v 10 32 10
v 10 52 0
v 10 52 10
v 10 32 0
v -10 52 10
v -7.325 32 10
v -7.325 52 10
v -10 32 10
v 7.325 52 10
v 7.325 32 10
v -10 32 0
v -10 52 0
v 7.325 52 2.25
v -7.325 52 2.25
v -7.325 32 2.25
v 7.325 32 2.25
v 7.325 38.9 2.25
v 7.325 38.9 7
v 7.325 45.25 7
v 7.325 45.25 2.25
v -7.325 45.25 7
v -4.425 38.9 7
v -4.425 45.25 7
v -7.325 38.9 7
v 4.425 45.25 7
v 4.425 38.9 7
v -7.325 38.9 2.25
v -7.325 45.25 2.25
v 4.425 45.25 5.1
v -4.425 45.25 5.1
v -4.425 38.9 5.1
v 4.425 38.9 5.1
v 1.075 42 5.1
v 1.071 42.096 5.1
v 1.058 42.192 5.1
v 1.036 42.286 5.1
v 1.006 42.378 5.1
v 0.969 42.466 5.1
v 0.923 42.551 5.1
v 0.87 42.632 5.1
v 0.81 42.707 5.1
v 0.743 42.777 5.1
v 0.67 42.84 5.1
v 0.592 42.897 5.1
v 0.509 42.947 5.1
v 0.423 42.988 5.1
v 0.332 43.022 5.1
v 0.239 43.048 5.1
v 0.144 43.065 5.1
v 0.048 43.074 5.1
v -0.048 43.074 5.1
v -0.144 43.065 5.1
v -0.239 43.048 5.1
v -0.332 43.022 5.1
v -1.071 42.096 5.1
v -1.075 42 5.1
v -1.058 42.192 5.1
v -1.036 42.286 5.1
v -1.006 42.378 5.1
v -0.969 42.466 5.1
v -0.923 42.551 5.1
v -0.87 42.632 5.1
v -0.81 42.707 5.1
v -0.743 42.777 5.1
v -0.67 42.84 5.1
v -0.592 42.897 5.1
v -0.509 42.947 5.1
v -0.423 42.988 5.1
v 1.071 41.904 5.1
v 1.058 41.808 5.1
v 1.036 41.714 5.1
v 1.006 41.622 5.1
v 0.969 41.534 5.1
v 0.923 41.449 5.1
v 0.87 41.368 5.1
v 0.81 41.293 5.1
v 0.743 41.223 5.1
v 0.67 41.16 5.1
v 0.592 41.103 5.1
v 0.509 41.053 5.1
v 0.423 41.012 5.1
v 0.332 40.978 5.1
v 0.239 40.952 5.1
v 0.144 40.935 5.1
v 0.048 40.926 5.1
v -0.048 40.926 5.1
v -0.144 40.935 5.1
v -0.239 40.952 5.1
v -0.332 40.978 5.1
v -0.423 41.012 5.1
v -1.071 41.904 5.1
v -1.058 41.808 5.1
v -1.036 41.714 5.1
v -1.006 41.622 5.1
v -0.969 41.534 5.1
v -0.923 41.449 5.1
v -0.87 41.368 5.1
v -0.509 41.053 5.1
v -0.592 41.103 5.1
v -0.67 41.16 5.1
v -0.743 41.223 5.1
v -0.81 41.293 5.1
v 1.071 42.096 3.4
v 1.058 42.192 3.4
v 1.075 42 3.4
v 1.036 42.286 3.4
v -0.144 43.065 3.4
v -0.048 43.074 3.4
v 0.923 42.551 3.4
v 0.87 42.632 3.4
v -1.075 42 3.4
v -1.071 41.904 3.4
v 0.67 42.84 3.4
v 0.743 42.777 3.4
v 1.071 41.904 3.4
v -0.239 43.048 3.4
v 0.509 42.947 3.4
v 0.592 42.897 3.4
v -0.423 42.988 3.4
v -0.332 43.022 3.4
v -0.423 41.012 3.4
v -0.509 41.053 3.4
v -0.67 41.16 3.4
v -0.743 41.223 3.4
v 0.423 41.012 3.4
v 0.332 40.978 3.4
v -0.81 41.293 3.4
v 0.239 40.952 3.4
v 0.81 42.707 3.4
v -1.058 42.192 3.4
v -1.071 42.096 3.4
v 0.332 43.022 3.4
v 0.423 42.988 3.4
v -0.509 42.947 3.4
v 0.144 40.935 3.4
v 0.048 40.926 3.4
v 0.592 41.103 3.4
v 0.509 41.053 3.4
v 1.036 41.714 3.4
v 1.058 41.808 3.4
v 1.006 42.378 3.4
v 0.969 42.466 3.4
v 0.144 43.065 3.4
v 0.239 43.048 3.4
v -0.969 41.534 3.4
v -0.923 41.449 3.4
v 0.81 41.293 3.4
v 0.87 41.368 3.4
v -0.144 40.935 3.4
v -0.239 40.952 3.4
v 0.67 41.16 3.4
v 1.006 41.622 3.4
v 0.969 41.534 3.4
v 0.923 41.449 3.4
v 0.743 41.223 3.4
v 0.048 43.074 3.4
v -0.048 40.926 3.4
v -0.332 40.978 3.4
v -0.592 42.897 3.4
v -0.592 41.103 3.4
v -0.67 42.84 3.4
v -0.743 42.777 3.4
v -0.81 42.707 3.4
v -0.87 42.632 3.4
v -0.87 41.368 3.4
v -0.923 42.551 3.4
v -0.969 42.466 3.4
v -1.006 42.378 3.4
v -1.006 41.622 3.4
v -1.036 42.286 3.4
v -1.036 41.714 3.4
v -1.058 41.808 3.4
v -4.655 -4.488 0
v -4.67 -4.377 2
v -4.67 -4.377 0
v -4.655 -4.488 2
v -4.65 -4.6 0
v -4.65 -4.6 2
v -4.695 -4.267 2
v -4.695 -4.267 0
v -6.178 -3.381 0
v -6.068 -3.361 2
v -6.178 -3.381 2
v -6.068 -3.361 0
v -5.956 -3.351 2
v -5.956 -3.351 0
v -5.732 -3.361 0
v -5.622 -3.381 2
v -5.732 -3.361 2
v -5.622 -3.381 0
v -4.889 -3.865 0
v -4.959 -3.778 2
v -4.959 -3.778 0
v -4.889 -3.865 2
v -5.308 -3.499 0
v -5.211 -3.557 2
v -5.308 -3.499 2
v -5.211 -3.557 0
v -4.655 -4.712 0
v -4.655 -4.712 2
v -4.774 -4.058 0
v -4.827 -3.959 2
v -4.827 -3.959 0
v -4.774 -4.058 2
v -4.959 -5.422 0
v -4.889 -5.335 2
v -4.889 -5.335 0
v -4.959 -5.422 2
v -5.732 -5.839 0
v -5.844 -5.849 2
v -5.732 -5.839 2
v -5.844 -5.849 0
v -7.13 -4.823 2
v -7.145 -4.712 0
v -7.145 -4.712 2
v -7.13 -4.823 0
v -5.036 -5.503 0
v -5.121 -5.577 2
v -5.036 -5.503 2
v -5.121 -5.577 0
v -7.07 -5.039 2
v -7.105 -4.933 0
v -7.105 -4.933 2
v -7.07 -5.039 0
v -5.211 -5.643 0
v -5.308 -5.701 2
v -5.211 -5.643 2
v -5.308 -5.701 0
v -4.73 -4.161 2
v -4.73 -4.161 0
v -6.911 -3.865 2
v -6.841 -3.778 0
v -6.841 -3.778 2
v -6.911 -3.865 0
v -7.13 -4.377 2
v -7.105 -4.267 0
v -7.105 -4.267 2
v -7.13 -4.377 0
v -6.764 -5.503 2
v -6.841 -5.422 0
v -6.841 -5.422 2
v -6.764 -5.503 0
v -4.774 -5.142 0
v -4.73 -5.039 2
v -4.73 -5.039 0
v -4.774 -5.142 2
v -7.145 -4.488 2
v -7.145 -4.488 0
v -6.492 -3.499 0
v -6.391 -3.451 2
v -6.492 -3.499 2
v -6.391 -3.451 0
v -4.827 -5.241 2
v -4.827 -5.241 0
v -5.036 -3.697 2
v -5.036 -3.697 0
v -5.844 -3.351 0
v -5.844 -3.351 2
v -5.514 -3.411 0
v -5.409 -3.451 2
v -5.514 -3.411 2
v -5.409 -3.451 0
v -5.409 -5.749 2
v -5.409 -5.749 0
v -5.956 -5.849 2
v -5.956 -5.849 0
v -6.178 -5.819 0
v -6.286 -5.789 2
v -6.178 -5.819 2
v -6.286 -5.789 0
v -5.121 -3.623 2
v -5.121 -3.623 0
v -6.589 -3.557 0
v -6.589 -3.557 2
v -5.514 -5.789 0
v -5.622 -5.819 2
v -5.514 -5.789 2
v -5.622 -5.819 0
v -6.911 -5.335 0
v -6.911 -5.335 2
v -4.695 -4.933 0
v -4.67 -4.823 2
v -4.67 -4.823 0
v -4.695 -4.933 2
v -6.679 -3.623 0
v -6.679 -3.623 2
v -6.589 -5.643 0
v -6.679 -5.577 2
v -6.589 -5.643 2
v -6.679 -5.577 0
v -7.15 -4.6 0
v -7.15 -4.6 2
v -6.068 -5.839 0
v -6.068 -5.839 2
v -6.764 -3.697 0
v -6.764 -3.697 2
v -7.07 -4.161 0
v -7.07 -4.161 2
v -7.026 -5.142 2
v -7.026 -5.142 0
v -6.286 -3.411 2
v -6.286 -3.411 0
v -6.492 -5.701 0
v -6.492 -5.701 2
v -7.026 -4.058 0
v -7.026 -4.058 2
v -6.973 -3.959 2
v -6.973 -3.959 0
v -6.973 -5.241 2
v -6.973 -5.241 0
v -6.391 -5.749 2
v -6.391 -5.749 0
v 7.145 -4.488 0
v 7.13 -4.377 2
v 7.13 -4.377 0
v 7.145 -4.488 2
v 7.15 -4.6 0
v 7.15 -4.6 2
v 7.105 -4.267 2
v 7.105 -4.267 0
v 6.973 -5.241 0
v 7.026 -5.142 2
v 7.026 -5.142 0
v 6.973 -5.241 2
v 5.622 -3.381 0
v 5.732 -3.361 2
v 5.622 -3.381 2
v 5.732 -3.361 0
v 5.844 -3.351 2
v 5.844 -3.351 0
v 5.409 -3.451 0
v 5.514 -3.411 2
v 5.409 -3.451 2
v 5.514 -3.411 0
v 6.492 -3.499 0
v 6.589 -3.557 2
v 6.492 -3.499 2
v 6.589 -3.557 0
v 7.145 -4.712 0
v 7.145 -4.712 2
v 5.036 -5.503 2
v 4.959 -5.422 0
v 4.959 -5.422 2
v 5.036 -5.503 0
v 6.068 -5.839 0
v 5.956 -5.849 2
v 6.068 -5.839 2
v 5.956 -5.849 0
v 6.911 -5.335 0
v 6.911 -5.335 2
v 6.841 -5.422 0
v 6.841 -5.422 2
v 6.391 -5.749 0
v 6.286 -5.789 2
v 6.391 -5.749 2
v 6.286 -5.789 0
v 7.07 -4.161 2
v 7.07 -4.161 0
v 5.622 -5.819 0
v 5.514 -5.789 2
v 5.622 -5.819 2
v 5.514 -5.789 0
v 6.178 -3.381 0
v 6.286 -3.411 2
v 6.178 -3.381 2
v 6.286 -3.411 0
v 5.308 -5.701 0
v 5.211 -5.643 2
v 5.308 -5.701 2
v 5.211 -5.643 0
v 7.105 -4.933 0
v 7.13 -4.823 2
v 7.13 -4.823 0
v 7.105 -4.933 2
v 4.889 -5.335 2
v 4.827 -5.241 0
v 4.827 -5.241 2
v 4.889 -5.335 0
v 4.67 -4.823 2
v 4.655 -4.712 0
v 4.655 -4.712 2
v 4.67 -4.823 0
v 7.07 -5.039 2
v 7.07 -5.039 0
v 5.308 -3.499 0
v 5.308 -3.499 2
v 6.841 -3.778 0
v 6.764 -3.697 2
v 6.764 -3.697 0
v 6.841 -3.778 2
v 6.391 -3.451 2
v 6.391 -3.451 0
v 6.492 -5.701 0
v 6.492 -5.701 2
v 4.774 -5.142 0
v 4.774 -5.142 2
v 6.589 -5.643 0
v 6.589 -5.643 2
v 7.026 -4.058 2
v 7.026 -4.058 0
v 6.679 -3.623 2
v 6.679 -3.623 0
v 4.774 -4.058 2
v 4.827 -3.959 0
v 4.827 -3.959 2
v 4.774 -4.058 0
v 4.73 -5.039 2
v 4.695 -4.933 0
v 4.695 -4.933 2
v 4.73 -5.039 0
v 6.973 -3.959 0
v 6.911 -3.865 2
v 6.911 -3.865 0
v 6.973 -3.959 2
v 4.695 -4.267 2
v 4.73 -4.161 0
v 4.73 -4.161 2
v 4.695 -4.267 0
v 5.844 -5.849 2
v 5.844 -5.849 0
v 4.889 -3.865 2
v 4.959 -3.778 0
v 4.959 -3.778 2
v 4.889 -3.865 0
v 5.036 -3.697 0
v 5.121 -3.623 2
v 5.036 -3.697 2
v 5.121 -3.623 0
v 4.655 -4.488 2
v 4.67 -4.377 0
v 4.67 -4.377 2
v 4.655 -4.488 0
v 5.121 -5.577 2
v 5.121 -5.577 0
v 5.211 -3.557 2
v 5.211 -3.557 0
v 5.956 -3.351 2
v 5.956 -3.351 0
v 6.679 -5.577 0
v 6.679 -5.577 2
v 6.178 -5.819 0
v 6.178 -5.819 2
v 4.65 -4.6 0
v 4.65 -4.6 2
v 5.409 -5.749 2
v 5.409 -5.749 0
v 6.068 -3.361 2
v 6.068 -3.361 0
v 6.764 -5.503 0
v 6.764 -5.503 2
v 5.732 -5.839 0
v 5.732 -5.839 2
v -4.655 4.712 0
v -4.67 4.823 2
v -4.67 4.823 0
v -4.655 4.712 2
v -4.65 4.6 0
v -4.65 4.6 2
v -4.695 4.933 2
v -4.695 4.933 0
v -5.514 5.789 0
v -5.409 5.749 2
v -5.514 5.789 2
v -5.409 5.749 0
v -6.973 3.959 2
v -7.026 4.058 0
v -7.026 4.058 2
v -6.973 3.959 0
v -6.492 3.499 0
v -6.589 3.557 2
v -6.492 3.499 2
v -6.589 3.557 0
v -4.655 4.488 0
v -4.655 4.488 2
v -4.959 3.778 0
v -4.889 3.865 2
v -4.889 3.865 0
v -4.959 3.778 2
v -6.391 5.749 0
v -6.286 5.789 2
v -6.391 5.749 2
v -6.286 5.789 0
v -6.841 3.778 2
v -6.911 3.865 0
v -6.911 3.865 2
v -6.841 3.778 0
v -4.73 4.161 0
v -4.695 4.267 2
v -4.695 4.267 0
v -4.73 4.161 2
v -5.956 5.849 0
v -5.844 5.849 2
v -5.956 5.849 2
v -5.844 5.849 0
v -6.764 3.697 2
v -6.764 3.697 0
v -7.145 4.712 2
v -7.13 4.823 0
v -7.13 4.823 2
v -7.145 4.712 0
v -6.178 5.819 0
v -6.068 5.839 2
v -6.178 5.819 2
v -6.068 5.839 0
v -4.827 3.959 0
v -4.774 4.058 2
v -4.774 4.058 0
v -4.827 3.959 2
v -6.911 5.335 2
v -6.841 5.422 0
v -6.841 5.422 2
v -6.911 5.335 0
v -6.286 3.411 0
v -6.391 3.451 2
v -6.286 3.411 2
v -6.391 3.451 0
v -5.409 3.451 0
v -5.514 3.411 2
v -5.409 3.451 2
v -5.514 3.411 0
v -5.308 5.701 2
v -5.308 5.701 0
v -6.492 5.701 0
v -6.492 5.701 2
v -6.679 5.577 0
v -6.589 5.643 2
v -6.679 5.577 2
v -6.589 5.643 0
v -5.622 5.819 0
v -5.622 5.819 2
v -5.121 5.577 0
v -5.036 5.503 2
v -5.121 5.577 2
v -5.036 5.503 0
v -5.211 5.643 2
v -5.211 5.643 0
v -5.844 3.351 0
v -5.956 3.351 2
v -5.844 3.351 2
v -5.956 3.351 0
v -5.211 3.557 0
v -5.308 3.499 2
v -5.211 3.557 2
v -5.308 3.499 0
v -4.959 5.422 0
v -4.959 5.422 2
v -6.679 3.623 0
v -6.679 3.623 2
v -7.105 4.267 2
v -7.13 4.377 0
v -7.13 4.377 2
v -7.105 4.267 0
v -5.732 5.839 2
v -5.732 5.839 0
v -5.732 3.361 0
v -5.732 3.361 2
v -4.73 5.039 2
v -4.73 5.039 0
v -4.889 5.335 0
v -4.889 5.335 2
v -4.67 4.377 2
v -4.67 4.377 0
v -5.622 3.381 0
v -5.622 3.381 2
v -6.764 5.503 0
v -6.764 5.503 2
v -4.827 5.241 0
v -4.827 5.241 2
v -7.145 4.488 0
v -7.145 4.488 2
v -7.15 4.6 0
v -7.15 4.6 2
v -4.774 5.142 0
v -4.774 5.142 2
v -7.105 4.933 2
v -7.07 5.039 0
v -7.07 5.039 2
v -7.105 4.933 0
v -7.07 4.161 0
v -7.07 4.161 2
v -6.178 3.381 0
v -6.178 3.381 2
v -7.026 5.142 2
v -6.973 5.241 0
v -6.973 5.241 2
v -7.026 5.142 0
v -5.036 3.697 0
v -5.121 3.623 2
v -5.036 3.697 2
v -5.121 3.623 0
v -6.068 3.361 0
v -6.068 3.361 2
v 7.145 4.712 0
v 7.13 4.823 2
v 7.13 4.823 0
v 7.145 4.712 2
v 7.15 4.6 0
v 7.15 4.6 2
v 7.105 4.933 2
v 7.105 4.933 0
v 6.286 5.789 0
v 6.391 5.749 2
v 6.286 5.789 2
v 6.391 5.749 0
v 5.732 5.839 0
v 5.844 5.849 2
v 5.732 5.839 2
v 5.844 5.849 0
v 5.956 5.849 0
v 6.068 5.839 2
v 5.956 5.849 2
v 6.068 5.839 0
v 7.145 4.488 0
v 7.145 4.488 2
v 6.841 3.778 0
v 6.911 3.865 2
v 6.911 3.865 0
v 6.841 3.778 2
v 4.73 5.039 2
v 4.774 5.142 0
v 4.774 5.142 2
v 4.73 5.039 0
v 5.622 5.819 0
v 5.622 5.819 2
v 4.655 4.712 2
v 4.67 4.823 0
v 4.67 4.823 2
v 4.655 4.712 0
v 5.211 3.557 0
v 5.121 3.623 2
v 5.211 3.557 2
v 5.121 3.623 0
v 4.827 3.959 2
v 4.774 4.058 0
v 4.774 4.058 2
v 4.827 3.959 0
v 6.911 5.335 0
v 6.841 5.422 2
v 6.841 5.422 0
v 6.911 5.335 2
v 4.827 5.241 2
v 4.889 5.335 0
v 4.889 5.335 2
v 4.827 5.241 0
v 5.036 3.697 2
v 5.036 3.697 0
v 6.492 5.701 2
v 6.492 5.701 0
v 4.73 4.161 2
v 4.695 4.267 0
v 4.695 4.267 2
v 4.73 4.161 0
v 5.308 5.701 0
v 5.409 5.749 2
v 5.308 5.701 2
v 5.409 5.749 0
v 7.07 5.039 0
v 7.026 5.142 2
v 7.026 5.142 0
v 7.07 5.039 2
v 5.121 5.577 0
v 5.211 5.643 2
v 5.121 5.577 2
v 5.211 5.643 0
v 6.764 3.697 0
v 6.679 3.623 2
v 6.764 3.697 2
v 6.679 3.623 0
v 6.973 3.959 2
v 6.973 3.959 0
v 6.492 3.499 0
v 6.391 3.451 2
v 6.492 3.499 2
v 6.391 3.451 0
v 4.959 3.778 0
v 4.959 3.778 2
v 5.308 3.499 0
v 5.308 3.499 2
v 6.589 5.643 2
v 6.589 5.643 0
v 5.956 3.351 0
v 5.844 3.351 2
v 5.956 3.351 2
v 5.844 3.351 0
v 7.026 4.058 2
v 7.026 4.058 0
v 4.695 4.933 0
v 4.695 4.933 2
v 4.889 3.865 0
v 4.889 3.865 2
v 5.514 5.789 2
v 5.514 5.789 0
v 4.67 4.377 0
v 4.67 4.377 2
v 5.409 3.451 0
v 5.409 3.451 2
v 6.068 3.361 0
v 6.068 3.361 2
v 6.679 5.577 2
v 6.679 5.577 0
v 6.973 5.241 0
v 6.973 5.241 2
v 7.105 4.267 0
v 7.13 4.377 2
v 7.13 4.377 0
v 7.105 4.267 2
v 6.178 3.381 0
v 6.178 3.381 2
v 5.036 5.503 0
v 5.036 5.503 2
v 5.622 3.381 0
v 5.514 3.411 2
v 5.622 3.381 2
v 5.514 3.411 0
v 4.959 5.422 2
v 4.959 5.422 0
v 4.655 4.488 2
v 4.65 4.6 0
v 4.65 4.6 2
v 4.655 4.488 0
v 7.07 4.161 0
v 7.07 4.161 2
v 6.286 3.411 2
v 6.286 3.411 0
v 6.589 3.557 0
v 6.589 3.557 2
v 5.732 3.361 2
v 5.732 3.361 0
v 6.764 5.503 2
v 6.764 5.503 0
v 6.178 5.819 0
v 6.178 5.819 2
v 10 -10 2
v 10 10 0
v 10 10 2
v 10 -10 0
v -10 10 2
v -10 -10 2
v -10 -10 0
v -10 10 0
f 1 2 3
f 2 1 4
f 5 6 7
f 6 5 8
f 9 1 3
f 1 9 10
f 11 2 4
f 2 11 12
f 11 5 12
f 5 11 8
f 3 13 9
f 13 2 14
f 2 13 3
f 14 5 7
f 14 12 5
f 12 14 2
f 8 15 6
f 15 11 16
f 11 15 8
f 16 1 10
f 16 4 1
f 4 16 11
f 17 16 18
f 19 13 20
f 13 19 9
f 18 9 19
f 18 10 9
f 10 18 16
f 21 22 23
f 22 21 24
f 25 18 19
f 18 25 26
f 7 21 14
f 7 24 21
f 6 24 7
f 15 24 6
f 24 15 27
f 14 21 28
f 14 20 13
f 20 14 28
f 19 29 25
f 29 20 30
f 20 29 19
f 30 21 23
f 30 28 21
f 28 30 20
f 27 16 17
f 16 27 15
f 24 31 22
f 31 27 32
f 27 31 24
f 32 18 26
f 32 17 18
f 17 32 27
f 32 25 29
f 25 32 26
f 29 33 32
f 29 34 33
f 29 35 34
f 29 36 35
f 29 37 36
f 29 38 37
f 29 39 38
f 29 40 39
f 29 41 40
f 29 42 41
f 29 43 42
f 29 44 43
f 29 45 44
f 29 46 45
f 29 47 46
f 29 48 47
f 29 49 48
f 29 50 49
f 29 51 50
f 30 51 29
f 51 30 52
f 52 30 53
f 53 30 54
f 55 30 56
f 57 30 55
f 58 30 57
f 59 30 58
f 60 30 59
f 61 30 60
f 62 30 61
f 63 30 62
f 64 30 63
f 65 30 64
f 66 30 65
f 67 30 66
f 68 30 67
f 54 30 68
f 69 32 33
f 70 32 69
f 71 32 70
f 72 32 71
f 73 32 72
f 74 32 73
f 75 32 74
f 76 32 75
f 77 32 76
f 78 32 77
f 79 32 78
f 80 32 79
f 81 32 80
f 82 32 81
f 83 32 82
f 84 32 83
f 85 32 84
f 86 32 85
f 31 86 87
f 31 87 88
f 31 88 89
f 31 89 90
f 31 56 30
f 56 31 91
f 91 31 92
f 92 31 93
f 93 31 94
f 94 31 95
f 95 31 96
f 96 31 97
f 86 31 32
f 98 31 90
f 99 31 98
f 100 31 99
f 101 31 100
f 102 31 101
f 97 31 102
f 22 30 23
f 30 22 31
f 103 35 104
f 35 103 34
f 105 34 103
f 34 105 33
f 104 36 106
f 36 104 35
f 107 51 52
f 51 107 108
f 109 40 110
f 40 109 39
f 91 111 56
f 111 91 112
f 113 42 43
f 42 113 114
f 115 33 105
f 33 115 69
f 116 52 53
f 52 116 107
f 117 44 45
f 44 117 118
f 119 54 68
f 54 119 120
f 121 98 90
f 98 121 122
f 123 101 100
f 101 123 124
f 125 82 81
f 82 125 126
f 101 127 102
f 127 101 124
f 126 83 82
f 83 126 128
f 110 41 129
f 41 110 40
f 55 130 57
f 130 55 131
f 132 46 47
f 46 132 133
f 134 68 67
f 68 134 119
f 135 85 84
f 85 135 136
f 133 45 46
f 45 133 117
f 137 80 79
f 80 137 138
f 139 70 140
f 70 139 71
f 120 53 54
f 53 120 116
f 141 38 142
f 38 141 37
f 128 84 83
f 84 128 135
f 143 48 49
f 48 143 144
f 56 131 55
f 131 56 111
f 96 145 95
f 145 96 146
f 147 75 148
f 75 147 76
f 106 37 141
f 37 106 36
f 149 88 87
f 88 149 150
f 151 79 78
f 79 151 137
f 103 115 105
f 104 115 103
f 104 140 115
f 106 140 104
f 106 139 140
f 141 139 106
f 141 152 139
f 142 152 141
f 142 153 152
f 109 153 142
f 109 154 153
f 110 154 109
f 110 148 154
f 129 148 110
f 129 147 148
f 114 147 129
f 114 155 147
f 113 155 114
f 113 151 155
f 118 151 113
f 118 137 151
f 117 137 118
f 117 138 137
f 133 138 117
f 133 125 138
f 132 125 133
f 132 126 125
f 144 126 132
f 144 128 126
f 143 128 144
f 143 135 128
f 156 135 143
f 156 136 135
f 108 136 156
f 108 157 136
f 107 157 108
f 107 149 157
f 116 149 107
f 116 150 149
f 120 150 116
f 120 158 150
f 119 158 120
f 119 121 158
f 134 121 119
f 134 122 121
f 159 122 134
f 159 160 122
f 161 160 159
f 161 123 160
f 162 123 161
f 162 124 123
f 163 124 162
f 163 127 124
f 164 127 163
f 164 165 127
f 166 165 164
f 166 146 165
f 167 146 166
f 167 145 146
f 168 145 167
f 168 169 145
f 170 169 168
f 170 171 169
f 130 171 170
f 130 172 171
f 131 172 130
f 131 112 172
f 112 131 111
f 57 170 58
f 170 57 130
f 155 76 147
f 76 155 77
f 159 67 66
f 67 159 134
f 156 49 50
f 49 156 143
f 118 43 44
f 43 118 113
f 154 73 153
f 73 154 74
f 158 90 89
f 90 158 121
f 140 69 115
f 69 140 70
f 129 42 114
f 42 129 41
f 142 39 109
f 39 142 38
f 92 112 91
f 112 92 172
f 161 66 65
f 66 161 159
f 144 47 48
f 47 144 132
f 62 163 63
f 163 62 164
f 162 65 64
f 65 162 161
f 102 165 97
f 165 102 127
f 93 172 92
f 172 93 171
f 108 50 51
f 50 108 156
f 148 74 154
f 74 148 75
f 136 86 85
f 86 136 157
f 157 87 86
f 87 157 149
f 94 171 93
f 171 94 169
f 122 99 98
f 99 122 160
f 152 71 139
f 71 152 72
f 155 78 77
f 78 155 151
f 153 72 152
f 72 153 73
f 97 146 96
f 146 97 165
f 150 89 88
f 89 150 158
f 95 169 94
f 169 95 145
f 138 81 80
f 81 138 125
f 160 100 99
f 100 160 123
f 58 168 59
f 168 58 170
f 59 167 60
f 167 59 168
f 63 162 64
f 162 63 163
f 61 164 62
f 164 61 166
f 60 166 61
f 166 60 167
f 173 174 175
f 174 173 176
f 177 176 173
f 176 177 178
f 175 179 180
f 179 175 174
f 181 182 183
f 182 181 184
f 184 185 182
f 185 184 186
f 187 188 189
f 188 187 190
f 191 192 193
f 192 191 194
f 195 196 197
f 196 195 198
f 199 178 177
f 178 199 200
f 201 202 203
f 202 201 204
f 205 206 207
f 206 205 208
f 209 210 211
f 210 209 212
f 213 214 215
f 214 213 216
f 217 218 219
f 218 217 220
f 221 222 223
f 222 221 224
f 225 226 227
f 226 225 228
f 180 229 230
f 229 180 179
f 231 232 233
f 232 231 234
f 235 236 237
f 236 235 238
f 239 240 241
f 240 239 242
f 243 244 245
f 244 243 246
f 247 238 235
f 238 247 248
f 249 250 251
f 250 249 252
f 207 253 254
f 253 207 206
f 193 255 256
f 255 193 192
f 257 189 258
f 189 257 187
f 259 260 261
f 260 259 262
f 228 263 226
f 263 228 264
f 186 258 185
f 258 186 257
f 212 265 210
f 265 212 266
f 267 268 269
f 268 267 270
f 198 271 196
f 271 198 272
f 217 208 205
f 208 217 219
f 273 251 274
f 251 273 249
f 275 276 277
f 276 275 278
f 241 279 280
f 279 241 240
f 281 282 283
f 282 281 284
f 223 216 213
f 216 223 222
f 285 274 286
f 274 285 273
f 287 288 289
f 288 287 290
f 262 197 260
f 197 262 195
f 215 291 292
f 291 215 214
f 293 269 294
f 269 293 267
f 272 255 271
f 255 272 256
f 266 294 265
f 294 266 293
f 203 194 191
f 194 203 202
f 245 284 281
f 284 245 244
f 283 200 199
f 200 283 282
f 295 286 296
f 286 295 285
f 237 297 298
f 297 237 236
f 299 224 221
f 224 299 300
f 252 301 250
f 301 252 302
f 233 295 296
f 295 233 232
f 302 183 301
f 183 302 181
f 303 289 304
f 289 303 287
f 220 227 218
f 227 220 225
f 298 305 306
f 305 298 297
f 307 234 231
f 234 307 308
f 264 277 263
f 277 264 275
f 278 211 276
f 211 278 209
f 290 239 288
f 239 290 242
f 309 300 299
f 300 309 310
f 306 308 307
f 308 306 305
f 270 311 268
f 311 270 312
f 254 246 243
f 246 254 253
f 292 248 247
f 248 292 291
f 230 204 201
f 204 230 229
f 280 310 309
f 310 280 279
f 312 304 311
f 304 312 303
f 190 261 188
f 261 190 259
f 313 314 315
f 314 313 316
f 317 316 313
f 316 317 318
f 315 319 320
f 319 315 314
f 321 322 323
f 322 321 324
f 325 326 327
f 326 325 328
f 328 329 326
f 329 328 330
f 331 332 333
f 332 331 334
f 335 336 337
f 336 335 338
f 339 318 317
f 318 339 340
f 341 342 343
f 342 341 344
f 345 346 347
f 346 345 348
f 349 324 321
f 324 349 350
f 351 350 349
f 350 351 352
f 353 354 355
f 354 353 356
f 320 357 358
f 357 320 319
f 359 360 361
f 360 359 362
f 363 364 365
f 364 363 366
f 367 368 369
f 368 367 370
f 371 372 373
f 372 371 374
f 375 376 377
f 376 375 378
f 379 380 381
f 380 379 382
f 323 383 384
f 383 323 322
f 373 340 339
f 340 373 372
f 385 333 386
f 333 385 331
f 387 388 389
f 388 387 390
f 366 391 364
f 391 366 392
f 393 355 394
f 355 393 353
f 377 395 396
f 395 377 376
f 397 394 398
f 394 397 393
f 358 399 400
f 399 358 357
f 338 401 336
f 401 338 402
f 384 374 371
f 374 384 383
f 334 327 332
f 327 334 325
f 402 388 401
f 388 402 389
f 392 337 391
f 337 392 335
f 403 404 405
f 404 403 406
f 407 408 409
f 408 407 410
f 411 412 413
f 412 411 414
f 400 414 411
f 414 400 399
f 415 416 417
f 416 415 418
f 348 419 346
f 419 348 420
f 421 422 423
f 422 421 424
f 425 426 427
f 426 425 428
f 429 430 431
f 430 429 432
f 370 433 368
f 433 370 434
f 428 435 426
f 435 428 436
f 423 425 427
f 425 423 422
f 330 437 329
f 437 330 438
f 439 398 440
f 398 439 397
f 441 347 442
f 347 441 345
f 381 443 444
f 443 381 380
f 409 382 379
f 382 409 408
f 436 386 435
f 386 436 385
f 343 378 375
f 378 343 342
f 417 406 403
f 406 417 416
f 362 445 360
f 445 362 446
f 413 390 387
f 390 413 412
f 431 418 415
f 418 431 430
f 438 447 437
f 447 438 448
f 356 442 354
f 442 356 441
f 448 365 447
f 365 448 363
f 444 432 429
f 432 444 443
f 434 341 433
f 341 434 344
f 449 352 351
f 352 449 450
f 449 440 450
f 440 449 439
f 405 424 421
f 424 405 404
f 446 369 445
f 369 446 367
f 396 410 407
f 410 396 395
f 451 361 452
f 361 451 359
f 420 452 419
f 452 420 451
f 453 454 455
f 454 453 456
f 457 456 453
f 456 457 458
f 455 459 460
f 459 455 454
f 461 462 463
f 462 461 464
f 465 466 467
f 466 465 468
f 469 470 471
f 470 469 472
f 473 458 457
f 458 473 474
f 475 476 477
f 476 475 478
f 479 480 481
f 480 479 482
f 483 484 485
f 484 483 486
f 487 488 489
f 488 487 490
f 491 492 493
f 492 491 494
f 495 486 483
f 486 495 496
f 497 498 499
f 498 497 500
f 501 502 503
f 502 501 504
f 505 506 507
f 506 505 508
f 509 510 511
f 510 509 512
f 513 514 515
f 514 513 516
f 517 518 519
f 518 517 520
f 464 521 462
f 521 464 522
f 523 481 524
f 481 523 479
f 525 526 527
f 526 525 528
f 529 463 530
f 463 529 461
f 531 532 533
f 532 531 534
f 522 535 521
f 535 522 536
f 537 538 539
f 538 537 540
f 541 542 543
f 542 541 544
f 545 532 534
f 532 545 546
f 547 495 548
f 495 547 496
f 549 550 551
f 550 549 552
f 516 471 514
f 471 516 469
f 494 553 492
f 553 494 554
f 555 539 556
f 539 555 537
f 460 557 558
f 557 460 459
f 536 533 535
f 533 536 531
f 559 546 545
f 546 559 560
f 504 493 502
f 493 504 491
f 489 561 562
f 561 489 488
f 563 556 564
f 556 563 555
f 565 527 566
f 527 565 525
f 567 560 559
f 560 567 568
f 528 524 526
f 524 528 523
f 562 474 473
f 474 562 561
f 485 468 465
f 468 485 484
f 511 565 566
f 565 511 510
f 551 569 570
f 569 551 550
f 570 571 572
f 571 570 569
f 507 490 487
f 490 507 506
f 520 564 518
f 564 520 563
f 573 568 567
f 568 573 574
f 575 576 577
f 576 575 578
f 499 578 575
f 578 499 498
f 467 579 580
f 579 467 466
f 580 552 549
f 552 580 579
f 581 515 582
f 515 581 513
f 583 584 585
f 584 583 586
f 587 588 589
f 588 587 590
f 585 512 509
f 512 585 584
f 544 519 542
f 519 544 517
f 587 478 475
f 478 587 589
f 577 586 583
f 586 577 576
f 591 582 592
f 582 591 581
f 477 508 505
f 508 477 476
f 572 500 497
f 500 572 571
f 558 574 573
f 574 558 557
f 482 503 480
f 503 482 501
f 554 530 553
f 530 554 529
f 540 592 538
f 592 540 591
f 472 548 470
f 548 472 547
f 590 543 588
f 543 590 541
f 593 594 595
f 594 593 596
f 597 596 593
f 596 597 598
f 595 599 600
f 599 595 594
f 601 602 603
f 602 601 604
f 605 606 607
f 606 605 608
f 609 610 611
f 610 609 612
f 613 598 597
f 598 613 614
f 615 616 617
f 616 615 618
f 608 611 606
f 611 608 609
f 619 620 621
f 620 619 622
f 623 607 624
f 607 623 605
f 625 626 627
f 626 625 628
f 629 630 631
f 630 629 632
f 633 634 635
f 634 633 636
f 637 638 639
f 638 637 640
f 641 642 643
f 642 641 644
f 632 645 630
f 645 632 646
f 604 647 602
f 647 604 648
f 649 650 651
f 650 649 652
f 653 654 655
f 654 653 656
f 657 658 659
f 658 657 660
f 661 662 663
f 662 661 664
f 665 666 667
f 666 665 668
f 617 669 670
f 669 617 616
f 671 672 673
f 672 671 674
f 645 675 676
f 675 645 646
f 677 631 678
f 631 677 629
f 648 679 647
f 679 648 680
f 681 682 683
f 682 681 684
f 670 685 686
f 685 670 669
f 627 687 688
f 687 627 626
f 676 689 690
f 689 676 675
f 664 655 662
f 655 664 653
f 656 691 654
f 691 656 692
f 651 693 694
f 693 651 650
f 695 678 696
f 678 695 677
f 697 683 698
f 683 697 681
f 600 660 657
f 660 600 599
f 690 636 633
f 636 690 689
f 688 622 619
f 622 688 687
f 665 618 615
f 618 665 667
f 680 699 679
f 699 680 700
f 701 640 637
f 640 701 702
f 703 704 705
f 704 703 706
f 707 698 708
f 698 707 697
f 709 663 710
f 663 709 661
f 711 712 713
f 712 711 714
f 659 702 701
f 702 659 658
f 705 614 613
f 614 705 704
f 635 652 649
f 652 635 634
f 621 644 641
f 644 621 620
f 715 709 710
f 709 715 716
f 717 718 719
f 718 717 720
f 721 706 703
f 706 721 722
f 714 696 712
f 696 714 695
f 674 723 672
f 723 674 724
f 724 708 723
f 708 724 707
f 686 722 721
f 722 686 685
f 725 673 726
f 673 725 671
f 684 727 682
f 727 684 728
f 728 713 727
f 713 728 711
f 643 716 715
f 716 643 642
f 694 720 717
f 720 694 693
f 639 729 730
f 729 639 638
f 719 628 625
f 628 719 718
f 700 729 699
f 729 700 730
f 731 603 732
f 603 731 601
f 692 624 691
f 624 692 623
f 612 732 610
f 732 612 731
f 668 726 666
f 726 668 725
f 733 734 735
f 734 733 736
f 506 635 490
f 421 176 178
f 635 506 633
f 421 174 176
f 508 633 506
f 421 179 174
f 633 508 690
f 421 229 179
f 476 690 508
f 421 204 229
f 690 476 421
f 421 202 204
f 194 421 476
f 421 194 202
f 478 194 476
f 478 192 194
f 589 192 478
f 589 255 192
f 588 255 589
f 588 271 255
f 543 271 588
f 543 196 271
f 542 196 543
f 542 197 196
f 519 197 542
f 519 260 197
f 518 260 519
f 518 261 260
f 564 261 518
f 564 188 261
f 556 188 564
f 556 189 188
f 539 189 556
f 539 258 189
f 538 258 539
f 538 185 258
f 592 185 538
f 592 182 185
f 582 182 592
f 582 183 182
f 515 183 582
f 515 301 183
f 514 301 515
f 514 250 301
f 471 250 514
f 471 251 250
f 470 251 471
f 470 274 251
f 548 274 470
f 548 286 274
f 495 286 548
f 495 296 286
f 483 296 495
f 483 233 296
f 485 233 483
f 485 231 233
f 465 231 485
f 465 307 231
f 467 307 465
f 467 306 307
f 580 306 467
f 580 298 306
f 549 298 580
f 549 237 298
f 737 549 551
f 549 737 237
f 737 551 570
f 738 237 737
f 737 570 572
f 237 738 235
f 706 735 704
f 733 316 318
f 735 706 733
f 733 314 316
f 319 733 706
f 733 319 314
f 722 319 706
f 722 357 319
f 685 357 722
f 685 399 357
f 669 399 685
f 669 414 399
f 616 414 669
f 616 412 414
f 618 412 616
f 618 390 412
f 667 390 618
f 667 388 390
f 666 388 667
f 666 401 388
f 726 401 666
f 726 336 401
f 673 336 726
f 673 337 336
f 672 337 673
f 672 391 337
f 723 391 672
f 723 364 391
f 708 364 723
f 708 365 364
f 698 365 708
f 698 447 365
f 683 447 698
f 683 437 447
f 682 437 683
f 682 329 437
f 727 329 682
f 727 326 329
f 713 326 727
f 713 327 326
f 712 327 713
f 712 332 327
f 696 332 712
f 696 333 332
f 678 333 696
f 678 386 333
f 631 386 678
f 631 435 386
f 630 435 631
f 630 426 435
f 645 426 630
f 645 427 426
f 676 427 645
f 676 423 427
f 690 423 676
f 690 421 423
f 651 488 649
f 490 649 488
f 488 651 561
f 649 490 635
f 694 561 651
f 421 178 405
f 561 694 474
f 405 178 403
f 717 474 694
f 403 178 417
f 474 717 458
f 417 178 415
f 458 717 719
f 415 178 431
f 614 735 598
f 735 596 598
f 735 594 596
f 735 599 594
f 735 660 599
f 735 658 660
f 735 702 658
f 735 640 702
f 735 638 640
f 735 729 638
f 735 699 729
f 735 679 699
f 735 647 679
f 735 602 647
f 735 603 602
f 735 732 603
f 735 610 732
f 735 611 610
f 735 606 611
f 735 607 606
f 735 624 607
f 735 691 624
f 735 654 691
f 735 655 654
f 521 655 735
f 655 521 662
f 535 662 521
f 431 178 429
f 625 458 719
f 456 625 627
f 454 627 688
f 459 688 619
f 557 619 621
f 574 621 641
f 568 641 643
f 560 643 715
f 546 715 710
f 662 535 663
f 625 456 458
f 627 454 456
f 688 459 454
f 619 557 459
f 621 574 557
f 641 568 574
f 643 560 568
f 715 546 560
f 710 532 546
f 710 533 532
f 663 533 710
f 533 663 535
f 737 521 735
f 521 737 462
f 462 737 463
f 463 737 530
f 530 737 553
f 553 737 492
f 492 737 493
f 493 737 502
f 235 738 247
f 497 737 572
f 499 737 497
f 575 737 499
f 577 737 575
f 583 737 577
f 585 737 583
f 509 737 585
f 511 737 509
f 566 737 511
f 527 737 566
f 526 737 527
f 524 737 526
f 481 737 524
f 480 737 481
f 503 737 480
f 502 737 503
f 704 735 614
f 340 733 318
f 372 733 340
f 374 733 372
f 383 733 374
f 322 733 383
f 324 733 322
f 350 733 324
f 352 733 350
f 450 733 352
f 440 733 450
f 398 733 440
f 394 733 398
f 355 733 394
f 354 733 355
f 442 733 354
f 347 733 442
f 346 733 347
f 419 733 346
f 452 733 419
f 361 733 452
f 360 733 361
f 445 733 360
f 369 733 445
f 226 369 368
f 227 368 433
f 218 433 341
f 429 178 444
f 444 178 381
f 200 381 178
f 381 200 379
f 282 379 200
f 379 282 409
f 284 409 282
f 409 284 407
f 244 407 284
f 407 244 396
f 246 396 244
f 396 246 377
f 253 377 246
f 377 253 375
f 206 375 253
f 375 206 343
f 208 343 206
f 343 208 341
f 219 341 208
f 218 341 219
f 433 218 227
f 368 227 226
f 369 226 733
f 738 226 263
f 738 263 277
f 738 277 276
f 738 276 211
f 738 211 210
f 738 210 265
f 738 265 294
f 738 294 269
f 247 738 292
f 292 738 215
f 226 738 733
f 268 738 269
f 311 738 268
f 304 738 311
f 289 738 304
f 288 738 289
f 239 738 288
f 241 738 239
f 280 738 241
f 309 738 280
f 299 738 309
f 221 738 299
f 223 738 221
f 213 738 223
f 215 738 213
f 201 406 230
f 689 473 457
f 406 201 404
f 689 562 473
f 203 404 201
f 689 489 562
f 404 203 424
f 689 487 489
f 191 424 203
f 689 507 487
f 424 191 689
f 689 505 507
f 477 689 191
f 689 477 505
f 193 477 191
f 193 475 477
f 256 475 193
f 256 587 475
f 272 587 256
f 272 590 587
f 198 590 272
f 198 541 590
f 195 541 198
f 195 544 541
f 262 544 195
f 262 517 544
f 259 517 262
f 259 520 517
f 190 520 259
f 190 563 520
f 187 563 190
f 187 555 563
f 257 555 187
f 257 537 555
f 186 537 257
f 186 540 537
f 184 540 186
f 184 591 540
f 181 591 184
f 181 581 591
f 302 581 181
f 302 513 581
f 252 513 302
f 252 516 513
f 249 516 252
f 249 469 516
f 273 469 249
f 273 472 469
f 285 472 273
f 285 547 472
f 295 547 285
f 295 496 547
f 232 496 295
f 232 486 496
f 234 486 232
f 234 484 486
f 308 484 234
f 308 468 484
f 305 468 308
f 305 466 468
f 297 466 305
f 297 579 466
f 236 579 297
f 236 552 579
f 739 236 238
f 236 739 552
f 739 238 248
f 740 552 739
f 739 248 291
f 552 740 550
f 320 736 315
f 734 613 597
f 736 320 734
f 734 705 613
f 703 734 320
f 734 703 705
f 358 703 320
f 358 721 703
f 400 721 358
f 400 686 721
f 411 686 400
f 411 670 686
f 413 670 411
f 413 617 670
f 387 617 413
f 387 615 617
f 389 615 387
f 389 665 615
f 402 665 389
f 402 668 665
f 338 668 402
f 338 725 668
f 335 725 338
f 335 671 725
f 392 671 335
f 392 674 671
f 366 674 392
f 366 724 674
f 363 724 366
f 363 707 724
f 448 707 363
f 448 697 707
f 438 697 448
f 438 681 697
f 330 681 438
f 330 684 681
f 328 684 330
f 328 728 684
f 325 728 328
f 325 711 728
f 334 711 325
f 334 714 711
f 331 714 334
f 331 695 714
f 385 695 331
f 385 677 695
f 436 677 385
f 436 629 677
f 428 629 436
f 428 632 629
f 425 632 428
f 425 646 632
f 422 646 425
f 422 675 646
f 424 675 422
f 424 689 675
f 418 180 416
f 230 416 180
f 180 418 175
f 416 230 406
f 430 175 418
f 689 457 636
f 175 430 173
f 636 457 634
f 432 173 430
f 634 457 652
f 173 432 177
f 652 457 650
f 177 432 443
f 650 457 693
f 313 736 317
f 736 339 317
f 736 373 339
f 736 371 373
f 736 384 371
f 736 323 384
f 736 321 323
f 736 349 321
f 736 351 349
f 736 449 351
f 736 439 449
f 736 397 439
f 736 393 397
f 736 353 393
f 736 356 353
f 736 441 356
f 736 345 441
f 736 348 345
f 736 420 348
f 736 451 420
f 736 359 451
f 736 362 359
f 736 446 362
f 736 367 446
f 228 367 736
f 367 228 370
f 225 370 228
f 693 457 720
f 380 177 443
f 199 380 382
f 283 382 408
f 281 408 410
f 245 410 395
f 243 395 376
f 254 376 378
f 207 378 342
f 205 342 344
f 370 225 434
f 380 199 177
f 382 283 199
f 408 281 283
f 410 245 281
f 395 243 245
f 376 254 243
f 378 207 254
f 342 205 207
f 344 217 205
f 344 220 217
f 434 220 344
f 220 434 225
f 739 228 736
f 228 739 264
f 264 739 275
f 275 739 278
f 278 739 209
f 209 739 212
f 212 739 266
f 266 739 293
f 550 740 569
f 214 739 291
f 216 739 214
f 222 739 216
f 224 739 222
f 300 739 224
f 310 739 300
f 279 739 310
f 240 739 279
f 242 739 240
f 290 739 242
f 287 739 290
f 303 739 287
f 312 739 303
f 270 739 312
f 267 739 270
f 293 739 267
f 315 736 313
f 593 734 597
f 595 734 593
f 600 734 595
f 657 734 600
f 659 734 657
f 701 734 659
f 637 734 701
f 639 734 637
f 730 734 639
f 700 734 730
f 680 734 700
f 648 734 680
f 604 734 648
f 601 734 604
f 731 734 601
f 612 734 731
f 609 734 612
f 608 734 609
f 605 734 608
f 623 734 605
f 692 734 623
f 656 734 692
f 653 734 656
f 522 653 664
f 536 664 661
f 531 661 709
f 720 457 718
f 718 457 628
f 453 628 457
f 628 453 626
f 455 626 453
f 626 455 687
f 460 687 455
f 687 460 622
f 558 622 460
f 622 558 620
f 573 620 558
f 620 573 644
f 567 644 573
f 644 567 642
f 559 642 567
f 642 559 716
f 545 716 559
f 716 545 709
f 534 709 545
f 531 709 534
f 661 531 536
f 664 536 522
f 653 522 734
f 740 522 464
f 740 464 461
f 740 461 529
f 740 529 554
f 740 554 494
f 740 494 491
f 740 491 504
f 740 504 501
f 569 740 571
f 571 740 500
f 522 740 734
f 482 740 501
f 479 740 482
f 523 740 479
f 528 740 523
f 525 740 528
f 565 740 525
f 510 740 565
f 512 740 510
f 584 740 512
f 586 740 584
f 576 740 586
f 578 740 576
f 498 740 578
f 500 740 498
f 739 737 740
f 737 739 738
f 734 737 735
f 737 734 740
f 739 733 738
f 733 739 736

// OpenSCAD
// created by IndiePandaaaaa

$fn = 70;

tolerance = .15;
thickness = 2;
standard_width = 20;

function t(para) = para + tolerance;

module construction_socket() {
  stem_pin_diameter = 2.0;
  stem_pin_additional_height = 1.7;
  stem_width = 8.7;
  MX_case_to_stem_height = 1.9;
  MX_case_frame_height = 4.6;
  MX_case_width = 14.5;
  MX_case_pin_depth = 6.5;
  MX_case_additional_height = 3;
  full_width = standard_width;
  full_height = 10;

  difference() {
    translate([-full_width / 2, -full_width / 2, 0])
      cube([full_width, full_width, full_height]);
  
    height_1 = full_height - MX_case_additional_height;
    translate([-t(MX_case_width) / 2, -full_width / 2, height_1])
      cube([t(MX_case_width), t(full_width), full_height]);
  
    height_2 = height_1 - t(MX_case_frame_height);
    translate([-t(MX_case_width) / 2, MX_case_pin_depth / 2, height_2])
      cube([t(MX_case_width), t(full_width), full_height]);
    translate([-t(MX_case_width) / 2, -full_width - MX_case_pin_depth / 2, height_2])
      cube([t(MX_case_width), t(full_width), full_height]);
  
    height_3 = height_1 - MX_case_to_stem_height;
    translate([-t(stem_width) / 2, -full_width / 2, height_3])
      cube([t(stem_width), t(full_width), full_height]);
    
    height_4 = height_3 - stem_pin_additional_height;
    translate([0, 0, height_4])
      cylinder(d = t(stem_pin_diameter), h = full_height);
  }
}

module guide_plate_painting_socket() {
  location = [ [0, 0], [11.8, 0], [0, 9.2], [11.8, 9.2] ];
  size = 2.5;

  translate([-standard_width/2, -standard_width/2, 0]) difference() {
    cube([standard_width, standard_width, thickness]);
    translate([(standard_width-location[3][0])/2, (standard_width-location[3][1])/2, -.1]) for (i = [0:len(location)-1]) {
      translate([location[i][0], location[i][1], 0]) cylinder(d = size, h = thickness + .2);
    }
  }
}

translate([0, 42, 0]) construction_socket();
translate([0, 0, 0]) guide_plate_painting_socket();
